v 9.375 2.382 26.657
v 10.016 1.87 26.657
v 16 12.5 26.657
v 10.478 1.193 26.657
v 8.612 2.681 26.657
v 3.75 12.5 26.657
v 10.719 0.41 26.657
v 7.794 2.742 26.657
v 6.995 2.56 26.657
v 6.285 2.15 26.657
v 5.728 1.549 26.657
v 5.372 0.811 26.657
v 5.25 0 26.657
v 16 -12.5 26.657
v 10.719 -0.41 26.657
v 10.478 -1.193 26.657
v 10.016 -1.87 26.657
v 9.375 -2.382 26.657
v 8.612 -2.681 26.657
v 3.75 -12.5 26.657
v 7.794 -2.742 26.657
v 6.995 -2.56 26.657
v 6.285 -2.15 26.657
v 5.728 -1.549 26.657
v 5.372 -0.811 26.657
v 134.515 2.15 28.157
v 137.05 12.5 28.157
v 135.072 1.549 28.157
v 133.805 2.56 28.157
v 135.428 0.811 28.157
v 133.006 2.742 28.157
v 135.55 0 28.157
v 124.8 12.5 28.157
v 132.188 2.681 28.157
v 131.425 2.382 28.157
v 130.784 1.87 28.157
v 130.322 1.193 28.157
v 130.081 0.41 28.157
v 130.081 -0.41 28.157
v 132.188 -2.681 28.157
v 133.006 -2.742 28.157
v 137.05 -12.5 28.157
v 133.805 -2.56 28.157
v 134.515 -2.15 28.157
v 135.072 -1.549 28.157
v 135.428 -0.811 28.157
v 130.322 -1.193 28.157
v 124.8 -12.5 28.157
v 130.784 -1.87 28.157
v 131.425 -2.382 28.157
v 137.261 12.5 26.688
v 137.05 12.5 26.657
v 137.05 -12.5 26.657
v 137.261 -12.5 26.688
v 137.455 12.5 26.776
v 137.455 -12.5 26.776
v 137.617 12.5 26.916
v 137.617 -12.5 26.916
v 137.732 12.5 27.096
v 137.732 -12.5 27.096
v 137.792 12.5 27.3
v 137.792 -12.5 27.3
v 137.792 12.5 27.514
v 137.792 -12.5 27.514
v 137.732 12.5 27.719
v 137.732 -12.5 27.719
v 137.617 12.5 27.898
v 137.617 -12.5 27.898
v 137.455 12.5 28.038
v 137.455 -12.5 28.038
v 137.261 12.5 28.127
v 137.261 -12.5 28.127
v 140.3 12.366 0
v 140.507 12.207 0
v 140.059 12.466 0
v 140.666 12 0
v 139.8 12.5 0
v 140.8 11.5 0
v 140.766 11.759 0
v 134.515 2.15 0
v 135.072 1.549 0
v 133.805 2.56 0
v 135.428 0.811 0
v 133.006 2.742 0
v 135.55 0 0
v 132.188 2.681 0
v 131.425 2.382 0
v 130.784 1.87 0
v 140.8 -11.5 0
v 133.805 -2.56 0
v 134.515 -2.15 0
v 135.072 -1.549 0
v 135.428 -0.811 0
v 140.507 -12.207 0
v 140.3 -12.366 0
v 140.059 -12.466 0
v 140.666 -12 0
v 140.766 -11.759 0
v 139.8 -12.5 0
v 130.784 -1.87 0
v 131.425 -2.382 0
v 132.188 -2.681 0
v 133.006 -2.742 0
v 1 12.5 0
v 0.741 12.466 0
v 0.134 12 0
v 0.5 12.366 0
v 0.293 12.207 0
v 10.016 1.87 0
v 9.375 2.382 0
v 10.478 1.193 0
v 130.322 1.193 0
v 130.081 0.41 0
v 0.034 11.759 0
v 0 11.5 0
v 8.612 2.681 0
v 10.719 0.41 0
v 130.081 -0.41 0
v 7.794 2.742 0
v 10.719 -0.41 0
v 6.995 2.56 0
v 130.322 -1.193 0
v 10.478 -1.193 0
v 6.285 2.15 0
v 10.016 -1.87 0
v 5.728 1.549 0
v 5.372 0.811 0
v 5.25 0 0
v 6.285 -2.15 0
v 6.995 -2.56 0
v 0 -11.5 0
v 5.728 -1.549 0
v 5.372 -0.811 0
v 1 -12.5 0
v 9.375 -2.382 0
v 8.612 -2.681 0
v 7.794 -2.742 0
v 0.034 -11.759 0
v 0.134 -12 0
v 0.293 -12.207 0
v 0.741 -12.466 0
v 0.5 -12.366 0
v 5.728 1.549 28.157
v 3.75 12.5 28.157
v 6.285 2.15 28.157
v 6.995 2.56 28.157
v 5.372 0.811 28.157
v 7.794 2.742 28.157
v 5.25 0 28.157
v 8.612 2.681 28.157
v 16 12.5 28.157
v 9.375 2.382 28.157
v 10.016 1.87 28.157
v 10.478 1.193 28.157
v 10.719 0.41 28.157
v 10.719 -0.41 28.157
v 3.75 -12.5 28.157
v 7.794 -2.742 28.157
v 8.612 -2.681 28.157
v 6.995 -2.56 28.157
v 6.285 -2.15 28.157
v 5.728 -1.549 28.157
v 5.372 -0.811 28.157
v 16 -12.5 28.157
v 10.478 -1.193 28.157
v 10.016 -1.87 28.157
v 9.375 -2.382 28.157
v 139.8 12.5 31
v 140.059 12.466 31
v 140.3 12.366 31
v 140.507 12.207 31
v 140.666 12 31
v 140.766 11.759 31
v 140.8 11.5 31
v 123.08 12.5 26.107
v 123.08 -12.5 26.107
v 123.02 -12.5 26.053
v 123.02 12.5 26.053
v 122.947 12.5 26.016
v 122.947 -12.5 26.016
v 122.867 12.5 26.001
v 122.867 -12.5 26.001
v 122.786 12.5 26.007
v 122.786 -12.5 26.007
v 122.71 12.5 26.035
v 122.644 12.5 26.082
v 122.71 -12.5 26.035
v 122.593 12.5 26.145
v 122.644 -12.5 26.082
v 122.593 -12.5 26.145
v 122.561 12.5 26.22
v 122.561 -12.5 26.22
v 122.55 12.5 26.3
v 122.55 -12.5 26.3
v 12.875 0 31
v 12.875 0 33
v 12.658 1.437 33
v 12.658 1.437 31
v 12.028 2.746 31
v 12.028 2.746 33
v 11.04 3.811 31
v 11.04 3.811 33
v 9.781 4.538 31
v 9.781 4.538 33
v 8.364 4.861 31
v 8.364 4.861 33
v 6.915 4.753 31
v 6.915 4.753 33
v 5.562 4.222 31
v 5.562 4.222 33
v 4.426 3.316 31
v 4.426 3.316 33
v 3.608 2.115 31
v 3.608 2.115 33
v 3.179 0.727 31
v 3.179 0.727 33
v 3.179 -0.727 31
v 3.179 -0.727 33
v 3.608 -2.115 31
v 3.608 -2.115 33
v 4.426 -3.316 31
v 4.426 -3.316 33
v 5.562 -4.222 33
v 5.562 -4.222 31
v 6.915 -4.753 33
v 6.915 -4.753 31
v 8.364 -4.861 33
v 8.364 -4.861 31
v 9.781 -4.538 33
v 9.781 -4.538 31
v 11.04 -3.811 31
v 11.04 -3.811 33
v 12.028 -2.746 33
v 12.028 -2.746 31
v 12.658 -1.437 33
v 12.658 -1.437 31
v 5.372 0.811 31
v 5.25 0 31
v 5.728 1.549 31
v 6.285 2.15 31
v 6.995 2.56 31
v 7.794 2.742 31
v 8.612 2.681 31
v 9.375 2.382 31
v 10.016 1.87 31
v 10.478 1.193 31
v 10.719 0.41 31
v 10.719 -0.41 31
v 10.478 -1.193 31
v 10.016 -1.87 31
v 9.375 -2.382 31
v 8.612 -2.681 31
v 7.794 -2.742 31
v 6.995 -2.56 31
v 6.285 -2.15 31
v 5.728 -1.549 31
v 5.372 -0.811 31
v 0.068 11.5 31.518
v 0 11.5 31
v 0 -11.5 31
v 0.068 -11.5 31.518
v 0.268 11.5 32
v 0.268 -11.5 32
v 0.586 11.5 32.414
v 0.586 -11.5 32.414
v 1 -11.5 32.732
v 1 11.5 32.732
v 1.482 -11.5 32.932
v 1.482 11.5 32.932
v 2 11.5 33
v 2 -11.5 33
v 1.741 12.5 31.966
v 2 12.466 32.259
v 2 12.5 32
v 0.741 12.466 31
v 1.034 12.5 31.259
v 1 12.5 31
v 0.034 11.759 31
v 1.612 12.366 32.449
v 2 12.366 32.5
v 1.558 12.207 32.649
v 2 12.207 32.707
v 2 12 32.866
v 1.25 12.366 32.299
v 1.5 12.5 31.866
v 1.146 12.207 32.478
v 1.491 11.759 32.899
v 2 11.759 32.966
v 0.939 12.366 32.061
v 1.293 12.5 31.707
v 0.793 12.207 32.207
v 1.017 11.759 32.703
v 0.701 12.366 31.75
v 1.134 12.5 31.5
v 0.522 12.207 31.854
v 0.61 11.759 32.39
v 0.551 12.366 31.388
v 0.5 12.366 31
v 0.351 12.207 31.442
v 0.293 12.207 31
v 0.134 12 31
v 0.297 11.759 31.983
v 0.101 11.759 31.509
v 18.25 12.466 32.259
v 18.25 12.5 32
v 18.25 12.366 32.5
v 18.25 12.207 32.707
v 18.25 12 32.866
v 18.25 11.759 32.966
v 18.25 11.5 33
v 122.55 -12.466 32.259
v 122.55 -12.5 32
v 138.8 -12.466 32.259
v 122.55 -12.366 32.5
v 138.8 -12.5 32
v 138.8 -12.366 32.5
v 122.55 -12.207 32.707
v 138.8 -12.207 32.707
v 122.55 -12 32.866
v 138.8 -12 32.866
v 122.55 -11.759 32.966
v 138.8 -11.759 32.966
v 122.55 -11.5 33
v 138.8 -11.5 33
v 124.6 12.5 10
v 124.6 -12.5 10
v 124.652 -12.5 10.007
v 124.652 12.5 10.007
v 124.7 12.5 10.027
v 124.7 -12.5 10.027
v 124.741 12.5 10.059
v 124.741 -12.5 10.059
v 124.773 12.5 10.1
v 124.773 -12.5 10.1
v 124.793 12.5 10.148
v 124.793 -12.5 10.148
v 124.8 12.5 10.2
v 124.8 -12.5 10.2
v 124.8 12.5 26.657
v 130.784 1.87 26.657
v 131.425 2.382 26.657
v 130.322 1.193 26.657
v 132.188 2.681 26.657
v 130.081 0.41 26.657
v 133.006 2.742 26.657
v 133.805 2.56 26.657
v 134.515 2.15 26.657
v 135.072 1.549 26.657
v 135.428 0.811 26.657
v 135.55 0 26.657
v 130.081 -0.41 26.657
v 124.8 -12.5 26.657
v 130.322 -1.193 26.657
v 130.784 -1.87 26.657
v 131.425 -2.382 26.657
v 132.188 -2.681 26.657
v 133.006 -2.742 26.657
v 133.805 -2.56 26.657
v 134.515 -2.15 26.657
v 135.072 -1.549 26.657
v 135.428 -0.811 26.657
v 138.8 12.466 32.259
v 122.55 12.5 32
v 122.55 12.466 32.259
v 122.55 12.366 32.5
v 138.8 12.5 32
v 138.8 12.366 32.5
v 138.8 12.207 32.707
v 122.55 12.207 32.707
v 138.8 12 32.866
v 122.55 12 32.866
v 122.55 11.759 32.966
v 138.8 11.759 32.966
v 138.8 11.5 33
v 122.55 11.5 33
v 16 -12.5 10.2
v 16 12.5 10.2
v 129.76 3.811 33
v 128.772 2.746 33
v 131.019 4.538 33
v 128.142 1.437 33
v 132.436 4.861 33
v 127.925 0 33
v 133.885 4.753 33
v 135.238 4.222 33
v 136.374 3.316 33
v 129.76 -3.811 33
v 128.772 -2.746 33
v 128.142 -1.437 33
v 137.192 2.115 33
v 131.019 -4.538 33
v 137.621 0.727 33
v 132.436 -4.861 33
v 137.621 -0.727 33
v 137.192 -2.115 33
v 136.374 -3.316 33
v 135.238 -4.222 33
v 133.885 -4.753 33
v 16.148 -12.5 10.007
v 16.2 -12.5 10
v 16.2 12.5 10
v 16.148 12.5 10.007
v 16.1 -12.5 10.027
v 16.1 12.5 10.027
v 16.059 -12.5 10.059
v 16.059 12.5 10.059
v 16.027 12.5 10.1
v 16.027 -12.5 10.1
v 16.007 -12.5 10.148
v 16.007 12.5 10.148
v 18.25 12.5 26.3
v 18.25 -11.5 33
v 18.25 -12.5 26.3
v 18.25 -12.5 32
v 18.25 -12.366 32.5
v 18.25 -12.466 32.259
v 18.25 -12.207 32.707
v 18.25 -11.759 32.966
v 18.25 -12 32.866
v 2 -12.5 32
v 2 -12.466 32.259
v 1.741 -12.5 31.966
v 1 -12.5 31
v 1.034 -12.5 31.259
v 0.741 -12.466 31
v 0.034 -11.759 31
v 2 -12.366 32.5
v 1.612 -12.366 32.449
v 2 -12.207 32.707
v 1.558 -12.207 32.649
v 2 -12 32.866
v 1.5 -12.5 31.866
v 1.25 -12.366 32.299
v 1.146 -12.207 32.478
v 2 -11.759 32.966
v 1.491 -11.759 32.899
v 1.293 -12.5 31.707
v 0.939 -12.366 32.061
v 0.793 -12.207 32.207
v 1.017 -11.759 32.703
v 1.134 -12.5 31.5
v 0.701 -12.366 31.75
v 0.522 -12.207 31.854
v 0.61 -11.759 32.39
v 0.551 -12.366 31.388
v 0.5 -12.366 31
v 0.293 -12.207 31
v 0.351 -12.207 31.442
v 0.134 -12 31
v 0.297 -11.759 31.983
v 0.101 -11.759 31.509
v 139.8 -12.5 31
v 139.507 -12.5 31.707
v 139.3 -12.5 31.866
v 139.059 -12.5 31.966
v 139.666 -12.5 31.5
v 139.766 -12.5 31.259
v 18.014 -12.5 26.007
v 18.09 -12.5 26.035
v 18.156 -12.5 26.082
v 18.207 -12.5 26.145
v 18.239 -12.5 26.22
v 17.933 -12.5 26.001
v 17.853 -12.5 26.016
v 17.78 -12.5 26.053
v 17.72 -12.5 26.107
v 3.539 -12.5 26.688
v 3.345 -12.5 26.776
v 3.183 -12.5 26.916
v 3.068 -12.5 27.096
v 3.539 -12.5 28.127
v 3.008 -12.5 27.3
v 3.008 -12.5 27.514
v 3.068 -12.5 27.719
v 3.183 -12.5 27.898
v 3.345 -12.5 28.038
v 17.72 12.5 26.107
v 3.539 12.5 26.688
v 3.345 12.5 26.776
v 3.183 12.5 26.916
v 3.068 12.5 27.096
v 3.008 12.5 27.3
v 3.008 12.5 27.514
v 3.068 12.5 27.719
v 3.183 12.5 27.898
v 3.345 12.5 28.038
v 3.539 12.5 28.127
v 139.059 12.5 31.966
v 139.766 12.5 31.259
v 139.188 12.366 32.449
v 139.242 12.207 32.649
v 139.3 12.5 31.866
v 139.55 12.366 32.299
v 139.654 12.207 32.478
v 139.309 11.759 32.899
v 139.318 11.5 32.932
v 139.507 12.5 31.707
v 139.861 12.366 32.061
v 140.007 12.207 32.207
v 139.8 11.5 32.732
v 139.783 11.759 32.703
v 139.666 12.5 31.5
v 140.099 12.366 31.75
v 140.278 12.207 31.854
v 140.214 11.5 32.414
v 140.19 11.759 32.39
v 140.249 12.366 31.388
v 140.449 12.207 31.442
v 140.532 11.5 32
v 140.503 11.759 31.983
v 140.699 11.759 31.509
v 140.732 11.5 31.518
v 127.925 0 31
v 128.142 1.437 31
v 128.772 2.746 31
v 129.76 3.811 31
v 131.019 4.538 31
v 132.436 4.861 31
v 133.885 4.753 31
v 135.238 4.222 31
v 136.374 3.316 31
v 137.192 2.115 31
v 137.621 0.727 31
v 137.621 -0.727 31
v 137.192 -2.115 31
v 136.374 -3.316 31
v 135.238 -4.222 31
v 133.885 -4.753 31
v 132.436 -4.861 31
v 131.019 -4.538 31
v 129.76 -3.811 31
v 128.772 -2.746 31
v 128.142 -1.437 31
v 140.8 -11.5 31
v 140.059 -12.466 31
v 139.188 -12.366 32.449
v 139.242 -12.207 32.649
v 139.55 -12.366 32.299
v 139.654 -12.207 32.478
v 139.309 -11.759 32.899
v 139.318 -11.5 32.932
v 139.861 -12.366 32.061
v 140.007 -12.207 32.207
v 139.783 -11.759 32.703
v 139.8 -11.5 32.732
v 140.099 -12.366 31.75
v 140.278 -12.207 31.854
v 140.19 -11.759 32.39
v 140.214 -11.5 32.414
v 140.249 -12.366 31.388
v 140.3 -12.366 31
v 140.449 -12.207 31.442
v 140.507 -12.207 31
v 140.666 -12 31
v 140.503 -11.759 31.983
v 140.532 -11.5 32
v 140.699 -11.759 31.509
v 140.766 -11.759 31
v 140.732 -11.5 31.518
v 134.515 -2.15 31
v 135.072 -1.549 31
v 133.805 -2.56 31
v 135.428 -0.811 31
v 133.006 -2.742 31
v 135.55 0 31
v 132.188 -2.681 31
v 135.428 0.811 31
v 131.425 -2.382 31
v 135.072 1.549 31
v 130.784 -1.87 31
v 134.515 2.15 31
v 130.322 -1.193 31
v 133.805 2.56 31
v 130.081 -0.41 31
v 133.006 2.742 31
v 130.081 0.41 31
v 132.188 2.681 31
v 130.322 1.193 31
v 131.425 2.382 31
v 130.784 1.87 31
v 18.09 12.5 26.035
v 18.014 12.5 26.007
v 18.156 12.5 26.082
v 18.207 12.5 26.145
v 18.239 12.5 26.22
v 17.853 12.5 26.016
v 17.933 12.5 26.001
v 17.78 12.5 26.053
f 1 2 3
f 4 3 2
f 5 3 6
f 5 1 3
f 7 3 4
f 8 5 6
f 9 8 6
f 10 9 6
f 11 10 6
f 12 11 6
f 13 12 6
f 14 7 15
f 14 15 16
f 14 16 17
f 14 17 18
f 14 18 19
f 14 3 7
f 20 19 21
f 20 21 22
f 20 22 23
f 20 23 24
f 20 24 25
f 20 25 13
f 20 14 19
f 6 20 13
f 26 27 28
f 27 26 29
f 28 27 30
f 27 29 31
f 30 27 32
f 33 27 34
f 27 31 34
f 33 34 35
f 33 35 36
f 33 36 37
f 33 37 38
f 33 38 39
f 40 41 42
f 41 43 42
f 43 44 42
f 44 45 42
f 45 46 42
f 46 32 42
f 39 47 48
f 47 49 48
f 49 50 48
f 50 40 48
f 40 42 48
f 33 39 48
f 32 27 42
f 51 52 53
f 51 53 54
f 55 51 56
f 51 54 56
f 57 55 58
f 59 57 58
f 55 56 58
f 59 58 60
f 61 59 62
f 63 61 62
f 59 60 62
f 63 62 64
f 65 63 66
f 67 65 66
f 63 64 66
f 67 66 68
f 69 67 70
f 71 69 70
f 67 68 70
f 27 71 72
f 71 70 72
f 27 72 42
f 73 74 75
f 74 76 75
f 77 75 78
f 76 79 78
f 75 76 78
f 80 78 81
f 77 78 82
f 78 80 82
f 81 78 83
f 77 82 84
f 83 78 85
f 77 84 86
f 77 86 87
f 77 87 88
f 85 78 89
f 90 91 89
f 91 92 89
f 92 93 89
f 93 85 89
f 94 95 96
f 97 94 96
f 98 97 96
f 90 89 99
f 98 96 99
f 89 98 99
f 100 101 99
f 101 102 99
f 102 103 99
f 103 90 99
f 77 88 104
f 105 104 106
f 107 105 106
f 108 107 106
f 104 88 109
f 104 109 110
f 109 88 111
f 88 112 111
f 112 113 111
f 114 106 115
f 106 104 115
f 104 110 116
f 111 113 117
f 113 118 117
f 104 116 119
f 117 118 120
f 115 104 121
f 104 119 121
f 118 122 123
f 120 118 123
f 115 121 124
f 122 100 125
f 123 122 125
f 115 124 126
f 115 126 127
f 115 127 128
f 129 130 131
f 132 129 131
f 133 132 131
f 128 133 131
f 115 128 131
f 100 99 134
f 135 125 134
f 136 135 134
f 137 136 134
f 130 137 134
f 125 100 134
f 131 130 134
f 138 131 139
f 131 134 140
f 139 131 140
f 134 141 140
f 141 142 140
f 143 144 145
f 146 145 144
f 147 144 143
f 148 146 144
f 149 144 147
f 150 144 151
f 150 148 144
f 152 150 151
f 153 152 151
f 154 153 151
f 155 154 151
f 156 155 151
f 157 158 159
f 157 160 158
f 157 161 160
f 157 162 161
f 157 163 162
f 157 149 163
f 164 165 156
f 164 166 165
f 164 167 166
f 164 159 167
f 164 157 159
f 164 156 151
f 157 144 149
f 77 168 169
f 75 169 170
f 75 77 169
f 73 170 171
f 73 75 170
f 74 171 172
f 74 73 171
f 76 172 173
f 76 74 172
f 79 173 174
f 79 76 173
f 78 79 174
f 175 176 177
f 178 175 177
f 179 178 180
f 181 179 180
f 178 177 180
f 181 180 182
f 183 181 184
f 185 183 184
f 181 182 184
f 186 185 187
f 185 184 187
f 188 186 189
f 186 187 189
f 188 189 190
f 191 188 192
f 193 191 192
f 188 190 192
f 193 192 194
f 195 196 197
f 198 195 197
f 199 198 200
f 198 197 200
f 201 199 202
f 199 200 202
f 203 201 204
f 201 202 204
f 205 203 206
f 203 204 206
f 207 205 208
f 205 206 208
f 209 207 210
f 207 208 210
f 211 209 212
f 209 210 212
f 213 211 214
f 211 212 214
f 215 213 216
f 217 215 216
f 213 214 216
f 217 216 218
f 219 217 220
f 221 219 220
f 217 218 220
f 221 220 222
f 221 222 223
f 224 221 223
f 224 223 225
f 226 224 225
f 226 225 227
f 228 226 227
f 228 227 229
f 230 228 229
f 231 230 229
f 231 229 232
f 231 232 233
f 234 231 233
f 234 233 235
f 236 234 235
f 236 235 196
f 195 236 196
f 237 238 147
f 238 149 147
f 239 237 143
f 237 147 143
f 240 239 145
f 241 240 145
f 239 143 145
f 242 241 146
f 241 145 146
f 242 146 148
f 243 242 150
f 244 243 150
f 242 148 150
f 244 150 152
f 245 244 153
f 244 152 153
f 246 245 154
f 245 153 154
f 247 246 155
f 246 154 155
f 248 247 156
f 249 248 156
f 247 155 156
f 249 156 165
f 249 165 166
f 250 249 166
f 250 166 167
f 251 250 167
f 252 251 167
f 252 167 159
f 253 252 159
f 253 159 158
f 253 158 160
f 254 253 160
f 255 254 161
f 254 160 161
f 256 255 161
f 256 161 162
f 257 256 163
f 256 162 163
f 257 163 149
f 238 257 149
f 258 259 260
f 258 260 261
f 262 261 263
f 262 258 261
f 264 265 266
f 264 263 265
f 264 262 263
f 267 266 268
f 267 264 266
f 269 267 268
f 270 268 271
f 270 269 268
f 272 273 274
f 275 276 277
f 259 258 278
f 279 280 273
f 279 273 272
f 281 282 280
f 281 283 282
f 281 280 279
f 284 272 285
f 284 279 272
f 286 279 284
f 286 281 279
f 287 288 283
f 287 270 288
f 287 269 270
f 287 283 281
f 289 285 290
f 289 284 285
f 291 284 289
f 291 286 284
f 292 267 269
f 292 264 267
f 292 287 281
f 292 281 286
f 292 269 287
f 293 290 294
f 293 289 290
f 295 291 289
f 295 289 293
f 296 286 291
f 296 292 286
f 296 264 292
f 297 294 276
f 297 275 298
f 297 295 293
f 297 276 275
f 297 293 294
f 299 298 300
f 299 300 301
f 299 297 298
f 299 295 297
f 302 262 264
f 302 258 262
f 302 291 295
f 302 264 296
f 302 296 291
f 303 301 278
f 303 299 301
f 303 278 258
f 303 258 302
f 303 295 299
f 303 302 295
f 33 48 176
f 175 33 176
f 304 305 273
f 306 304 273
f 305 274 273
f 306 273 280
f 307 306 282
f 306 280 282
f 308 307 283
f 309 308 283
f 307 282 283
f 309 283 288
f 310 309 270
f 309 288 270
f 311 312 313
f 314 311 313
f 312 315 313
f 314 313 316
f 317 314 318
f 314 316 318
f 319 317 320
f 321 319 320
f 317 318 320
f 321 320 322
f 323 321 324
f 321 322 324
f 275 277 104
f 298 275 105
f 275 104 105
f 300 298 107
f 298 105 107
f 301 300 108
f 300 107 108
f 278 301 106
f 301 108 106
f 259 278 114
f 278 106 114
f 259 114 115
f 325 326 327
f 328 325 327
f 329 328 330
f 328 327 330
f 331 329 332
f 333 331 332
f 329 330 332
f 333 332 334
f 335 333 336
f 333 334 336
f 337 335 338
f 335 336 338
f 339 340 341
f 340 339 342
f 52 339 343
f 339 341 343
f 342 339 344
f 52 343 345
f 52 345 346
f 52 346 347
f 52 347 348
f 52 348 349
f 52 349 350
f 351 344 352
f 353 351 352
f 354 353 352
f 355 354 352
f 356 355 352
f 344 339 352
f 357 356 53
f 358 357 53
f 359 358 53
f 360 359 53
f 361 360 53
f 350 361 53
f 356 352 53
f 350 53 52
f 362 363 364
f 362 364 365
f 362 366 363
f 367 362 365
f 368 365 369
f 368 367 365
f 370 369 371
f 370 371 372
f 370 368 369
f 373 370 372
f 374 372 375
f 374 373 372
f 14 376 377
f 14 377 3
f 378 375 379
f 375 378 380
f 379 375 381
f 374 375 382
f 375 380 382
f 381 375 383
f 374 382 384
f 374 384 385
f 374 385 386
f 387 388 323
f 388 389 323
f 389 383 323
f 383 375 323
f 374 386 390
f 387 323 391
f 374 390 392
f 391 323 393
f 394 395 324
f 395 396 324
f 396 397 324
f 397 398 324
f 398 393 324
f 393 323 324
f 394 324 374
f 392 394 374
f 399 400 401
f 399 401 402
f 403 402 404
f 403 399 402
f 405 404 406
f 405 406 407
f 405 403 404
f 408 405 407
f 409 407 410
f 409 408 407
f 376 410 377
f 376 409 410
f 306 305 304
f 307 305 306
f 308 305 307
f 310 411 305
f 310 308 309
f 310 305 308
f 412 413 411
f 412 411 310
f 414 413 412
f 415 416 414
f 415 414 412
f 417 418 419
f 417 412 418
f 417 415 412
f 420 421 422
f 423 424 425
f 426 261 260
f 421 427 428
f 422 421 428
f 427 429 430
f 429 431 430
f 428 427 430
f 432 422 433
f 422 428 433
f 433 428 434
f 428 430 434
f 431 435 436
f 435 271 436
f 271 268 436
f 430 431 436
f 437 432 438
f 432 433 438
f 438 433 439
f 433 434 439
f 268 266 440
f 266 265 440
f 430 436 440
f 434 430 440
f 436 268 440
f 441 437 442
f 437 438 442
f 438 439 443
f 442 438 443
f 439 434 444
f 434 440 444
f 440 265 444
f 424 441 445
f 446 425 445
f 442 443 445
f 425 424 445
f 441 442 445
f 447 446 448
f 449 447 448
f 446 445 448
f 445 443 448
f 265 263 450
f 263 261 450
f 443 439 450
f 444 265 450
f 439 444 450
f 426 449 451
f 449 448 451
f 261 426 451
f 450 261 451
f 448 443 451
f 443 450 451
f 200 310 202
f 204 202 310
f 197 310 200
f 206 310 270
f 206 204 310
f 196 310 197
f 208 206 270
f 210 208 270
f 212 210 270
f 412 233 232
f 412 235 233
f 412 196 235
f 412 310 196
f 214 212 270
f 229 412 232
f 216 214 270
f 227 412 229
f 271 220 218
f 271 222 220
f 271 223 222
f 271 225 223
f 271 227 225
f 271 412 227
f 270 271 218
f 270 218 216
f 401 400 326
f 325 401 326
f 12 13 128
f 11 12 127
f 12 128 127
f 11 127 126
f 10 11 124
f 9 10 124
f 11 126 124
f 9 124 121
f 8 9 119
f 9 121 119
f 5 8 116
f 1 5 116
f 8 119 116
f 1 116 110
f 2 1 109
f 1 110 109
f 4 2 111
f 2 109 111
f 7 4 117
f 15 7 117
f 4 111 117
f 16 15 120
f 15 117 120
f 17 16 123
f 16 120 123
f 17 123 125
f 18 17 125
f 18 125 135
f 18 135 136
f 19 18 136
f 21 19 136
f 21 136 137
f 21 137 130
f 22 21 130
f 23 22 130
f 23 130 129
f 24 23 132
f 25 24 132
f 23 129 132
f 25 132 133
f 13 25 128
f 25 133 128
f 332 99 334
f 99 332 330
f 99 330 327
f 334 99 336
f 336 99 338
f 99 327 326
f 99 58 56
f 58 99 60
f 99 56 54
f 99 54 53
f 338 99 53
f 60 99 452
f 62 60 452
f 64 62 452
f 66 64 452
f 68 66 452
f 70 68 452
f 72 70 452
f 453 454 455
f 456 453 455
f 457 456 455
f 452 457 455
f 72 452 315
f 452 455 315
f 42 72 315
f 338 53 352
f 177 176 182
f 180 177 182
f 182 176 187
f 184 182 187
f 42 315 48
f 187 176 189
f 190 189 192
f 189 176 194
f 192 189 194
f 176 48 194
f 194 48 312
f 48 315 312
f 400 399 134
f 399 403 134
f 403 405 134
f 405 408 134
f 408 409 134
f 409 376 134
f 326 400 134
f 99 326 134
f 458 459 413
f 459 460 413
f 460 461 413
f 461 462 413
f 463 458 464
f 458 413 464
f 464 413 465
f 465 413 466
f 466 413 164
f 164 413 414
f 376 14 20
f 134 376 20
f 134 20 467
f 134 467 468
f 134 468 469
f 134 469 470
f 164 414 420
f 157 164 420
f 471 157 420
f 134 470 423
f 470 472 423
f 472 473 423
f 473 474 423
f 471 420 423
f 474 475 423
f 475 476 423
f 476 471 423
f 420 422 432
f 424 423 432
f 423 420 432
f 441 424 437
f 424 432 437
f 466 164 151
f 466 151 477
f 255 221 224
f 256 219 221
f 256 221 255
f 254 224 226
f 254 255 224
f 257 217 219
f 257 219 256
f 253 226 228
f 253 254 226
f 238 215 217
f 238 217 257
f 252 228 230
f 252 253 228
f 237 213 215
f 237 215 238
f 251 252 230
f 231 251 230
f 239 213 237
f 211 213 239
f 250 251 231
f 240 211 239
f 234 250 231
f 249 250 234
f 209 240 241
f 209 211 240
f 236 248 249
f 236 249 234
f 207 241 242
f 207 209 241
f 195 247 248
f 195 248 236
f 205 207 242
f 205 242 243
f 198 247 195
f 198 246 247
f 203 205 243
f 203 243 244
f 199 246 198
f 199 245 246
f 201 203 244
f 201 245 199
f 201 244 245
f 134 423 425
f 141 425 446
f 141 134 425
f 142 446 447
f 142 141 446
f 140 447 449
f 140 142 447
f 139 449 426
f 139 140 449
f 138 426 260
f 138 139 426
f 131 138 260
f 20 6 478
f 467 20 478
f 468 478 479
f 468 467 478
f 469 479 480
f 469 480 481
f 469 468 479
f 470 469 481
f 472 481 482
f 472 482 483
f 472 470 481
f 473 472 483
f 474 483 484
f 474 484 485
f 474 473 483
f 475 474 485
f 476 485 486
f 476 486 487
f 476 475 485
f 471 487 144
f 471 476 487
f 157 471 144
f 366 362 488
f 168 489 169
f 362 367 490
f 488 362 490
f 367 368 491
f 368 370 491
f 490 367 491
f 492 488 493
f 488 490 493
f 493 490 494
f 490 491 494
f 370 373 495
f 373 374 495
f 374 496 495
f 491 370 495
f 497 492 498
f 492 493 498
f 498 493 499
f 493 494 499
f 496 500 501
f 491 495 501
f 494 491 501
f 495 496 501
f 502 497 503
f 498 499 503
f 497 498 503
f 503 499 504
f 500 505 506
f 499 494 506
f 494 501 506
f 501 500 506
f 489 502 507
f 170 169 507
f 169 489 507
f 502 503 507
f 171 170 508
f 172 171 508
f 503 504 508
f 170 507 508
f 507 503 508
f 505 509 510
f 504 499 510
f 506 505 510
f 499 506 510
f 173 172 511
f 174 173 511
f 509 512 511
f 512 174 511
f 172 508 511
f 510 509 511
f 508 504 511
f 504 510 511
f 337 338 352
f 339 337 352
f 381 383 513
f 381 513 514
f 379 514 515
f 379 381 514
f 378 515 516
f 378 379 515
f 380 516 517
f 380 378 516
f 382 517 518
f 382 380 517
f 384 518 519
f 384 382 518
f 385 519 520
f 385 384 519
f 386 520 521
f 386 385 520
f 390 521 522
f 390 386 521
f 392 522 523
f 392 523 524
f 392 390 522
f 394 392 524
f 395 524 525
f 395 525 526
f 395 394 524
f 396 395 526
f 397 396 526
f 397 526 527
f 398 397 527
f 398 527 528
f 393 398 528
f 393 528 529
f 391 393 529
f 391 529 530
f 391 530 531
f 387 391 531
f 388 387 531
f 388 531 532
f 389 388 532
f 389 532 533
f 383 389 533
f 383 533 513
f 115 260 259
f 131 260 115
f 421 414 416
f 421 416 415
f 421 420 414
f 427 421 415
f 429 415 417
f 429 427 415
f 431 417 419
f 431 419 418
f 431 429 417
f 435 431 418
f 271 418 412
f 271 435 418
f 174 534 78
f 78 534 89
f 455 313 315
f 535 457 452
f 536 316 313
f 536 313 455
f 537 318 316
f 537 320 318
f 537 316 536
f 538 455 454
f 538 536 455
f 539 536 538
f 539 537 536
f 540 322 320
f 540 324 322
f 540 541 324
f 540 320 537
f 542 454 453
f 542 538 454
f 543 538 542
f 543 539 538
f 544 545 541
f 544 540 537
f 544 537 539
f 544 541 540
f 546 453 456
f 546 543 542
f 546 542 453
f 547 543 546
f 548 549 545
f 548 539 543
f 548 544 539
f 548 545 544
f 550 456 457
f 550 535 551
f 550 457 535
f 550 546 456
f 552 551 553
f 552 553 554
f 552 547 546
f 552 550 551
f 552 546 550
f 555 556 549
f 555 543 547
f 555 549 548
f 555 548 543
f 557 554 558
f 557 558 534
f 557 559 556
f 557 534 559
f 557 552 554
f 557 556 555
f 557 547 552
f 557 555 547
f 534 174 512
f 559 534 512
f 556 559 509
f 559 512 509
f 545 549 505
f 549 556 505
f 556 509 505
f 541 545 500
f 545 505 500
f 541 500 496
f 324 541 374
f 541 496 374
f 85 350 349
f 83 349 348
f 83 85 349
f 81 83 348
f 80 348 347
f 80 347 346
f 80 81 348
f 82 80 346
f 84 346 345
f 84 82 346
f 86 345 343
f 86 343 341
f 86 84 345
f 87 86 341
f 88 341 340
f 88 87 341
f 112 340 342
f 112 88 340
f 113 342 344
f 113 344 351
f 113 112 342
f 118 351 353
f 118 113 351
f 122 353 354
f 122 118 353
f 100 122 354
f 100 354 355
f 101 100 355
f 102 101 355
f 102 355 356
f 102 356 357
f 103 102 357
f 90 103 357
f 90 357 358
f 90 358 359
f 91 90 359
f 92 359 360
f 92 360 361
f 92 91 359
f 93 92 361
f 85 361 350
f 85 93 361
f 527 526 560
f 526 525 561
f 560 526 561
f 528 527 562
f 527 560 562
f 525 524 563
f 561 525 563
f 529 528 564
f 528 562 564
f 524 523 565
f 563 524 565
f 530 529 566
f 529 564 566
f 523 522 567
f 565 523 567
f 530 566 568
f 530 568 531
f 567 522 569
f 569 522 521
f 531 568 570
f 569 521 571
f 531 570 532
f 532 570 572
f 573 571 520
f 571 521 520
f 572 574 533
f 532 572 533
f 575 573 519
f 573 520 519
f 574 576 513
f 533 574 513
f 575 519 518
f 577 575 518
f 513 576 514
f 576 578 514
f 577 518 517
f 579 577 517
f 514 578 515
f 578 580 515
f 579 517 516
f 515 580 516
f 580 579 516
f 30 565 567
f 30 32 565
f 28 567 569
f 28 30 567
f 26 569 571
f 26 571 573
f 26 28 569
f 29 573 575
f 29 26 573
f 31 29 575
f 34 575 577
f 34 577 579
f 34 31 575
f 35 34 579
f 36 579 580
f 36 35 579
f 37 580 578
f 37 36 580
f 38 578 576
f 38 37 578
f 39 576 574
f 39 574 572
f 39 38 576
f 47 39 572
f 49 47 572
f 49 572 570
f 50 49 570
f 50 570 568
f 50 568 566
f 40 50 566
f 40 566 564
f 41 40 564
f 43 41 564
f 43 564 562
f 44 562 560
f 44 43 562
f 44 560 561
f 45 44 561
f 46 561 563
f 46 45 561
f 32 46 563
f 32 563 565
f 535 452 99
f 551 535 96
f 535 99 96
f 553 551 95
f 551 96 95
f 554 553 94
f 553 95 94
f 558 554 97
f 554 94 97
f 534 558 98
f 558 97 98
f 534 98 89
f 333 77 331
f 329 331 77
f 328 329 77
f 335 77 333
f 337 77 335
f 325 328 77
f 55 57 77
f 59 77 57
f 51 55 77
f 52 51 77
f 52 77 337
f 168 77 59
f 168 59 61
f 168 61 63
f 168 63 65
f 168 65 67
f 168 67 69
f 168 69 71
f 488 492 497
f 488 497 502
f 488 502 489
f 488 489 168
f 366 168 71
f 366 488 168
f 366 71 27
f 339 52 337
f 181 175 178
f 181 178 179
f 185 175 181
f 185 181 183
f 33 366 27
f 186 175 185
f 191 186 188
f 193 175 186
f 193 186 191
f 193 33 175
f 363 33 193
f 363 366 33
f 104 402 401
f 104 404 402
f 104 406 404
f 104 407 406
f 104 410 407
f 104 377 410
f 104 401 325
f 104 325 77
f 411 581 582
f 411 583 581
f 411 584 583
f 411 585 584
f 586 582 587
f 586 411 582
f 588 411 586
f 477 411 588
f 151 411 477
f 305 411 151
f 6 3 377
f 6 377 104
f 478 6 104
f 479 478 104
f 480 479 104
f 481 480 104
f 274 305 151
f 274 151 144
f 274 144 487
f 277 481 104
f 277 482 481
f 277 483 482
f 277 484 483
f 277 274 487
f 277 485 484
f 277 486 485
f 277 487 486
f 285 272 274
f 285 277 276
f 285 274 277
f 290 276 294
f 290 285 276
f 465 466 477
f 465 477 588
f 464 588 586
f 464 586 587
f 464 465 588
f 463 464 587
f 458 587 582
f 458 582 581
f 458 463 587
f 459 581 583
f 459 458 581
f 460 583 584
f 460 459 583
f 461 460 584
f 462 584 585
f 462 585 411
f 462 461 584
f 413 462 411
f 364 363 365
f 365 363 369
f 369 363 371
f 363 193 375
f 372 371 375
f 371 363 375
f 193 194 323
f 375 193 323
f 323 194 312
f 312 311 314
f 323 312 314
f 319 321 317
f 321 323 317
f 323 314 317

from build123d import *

# Parameters (mm, degrees)
F1_DEPTH       = 12.5
F4_D           = 5.5
F4_CBORE_D     = 9.75
F4_CBORE_DEPTH = 2
F5_R           = 2
F6_R           = 1


with BuildPart() as f1:
    # F0 (on Front) → F1 (new body, symmetric)
    with BuildSketch(Plane.XZ):
        with BuildLine():
            Line((0, 33), (0, 0))
            Line((0, 0), (70.4, 0))
            Line((70.4, 0), (70.4, 10))
            Line((70.4, 10), (16.2, 10))
            ThreePointArc((16.2, 10), (16.0585786438, 10.0585786438), (16, 10.2))
            Line((16, 10.2), (16, 26.6572023575))
            Line((16, 26.6572023575), (3.75, 26.6572023575))
            ThreePointArc((3.75, 26.6572023575), (3, 27.4072023575), (3.75, 28.1572023575))
            Line((3.75, 28.1572023575), (16, 28.1572023575))
            Line((16, 28.1572023575), (17.7201866671, 26.1071637171))
            ThreePointArc((17.7201866671, 26.1071637171), (18.052606043, 26.0180922138), (18.25, 26.3))
            Line((18.25, 26.3), (18.25, 33))
            Line((18.25, 33), (0, 33))
        make_face()
    extrude(amount=F1_DEPTH, both=True)

    # F4 (through all)
    with Locations(Plane.XY.offset(33)):
        with Locations((8, 0)):
            CounterBoreHole(F4_D / 2, F4_CBORE_D / 2, F4_CBORE_DEPTH)

    # F5
    f5_edges = [f1.edges().sort_by_distance(p)[0] for p in [
        (0, 0, 33),
    ]]
    fillet(f5_edges, radius=F5_R)

    # F6
    f6_edges = [f1.edges().sort_by_distance(p)[0] for p in [
        (10.125, -12.5, 33),
        (0.585786, -12.5, 32.414214),
        (0, -12.5, 15.5),
        (10.125, 12.5, 33),
        (0.585786, 12.5, 32.414214),
        (0, 12.5, 15.5),
    ]]
    fillet(f6_edges, radius=F6_R)

    # F7: F1 across plane


with BuildPart() as f1_1:
    add(f1.part)
    add(f1.part.mirror(Plane(origin=(70.4, 0, 5), x_dir=(0, 1, 0), z_dir=(1, 0, 0))))


solid = f1_1.part
